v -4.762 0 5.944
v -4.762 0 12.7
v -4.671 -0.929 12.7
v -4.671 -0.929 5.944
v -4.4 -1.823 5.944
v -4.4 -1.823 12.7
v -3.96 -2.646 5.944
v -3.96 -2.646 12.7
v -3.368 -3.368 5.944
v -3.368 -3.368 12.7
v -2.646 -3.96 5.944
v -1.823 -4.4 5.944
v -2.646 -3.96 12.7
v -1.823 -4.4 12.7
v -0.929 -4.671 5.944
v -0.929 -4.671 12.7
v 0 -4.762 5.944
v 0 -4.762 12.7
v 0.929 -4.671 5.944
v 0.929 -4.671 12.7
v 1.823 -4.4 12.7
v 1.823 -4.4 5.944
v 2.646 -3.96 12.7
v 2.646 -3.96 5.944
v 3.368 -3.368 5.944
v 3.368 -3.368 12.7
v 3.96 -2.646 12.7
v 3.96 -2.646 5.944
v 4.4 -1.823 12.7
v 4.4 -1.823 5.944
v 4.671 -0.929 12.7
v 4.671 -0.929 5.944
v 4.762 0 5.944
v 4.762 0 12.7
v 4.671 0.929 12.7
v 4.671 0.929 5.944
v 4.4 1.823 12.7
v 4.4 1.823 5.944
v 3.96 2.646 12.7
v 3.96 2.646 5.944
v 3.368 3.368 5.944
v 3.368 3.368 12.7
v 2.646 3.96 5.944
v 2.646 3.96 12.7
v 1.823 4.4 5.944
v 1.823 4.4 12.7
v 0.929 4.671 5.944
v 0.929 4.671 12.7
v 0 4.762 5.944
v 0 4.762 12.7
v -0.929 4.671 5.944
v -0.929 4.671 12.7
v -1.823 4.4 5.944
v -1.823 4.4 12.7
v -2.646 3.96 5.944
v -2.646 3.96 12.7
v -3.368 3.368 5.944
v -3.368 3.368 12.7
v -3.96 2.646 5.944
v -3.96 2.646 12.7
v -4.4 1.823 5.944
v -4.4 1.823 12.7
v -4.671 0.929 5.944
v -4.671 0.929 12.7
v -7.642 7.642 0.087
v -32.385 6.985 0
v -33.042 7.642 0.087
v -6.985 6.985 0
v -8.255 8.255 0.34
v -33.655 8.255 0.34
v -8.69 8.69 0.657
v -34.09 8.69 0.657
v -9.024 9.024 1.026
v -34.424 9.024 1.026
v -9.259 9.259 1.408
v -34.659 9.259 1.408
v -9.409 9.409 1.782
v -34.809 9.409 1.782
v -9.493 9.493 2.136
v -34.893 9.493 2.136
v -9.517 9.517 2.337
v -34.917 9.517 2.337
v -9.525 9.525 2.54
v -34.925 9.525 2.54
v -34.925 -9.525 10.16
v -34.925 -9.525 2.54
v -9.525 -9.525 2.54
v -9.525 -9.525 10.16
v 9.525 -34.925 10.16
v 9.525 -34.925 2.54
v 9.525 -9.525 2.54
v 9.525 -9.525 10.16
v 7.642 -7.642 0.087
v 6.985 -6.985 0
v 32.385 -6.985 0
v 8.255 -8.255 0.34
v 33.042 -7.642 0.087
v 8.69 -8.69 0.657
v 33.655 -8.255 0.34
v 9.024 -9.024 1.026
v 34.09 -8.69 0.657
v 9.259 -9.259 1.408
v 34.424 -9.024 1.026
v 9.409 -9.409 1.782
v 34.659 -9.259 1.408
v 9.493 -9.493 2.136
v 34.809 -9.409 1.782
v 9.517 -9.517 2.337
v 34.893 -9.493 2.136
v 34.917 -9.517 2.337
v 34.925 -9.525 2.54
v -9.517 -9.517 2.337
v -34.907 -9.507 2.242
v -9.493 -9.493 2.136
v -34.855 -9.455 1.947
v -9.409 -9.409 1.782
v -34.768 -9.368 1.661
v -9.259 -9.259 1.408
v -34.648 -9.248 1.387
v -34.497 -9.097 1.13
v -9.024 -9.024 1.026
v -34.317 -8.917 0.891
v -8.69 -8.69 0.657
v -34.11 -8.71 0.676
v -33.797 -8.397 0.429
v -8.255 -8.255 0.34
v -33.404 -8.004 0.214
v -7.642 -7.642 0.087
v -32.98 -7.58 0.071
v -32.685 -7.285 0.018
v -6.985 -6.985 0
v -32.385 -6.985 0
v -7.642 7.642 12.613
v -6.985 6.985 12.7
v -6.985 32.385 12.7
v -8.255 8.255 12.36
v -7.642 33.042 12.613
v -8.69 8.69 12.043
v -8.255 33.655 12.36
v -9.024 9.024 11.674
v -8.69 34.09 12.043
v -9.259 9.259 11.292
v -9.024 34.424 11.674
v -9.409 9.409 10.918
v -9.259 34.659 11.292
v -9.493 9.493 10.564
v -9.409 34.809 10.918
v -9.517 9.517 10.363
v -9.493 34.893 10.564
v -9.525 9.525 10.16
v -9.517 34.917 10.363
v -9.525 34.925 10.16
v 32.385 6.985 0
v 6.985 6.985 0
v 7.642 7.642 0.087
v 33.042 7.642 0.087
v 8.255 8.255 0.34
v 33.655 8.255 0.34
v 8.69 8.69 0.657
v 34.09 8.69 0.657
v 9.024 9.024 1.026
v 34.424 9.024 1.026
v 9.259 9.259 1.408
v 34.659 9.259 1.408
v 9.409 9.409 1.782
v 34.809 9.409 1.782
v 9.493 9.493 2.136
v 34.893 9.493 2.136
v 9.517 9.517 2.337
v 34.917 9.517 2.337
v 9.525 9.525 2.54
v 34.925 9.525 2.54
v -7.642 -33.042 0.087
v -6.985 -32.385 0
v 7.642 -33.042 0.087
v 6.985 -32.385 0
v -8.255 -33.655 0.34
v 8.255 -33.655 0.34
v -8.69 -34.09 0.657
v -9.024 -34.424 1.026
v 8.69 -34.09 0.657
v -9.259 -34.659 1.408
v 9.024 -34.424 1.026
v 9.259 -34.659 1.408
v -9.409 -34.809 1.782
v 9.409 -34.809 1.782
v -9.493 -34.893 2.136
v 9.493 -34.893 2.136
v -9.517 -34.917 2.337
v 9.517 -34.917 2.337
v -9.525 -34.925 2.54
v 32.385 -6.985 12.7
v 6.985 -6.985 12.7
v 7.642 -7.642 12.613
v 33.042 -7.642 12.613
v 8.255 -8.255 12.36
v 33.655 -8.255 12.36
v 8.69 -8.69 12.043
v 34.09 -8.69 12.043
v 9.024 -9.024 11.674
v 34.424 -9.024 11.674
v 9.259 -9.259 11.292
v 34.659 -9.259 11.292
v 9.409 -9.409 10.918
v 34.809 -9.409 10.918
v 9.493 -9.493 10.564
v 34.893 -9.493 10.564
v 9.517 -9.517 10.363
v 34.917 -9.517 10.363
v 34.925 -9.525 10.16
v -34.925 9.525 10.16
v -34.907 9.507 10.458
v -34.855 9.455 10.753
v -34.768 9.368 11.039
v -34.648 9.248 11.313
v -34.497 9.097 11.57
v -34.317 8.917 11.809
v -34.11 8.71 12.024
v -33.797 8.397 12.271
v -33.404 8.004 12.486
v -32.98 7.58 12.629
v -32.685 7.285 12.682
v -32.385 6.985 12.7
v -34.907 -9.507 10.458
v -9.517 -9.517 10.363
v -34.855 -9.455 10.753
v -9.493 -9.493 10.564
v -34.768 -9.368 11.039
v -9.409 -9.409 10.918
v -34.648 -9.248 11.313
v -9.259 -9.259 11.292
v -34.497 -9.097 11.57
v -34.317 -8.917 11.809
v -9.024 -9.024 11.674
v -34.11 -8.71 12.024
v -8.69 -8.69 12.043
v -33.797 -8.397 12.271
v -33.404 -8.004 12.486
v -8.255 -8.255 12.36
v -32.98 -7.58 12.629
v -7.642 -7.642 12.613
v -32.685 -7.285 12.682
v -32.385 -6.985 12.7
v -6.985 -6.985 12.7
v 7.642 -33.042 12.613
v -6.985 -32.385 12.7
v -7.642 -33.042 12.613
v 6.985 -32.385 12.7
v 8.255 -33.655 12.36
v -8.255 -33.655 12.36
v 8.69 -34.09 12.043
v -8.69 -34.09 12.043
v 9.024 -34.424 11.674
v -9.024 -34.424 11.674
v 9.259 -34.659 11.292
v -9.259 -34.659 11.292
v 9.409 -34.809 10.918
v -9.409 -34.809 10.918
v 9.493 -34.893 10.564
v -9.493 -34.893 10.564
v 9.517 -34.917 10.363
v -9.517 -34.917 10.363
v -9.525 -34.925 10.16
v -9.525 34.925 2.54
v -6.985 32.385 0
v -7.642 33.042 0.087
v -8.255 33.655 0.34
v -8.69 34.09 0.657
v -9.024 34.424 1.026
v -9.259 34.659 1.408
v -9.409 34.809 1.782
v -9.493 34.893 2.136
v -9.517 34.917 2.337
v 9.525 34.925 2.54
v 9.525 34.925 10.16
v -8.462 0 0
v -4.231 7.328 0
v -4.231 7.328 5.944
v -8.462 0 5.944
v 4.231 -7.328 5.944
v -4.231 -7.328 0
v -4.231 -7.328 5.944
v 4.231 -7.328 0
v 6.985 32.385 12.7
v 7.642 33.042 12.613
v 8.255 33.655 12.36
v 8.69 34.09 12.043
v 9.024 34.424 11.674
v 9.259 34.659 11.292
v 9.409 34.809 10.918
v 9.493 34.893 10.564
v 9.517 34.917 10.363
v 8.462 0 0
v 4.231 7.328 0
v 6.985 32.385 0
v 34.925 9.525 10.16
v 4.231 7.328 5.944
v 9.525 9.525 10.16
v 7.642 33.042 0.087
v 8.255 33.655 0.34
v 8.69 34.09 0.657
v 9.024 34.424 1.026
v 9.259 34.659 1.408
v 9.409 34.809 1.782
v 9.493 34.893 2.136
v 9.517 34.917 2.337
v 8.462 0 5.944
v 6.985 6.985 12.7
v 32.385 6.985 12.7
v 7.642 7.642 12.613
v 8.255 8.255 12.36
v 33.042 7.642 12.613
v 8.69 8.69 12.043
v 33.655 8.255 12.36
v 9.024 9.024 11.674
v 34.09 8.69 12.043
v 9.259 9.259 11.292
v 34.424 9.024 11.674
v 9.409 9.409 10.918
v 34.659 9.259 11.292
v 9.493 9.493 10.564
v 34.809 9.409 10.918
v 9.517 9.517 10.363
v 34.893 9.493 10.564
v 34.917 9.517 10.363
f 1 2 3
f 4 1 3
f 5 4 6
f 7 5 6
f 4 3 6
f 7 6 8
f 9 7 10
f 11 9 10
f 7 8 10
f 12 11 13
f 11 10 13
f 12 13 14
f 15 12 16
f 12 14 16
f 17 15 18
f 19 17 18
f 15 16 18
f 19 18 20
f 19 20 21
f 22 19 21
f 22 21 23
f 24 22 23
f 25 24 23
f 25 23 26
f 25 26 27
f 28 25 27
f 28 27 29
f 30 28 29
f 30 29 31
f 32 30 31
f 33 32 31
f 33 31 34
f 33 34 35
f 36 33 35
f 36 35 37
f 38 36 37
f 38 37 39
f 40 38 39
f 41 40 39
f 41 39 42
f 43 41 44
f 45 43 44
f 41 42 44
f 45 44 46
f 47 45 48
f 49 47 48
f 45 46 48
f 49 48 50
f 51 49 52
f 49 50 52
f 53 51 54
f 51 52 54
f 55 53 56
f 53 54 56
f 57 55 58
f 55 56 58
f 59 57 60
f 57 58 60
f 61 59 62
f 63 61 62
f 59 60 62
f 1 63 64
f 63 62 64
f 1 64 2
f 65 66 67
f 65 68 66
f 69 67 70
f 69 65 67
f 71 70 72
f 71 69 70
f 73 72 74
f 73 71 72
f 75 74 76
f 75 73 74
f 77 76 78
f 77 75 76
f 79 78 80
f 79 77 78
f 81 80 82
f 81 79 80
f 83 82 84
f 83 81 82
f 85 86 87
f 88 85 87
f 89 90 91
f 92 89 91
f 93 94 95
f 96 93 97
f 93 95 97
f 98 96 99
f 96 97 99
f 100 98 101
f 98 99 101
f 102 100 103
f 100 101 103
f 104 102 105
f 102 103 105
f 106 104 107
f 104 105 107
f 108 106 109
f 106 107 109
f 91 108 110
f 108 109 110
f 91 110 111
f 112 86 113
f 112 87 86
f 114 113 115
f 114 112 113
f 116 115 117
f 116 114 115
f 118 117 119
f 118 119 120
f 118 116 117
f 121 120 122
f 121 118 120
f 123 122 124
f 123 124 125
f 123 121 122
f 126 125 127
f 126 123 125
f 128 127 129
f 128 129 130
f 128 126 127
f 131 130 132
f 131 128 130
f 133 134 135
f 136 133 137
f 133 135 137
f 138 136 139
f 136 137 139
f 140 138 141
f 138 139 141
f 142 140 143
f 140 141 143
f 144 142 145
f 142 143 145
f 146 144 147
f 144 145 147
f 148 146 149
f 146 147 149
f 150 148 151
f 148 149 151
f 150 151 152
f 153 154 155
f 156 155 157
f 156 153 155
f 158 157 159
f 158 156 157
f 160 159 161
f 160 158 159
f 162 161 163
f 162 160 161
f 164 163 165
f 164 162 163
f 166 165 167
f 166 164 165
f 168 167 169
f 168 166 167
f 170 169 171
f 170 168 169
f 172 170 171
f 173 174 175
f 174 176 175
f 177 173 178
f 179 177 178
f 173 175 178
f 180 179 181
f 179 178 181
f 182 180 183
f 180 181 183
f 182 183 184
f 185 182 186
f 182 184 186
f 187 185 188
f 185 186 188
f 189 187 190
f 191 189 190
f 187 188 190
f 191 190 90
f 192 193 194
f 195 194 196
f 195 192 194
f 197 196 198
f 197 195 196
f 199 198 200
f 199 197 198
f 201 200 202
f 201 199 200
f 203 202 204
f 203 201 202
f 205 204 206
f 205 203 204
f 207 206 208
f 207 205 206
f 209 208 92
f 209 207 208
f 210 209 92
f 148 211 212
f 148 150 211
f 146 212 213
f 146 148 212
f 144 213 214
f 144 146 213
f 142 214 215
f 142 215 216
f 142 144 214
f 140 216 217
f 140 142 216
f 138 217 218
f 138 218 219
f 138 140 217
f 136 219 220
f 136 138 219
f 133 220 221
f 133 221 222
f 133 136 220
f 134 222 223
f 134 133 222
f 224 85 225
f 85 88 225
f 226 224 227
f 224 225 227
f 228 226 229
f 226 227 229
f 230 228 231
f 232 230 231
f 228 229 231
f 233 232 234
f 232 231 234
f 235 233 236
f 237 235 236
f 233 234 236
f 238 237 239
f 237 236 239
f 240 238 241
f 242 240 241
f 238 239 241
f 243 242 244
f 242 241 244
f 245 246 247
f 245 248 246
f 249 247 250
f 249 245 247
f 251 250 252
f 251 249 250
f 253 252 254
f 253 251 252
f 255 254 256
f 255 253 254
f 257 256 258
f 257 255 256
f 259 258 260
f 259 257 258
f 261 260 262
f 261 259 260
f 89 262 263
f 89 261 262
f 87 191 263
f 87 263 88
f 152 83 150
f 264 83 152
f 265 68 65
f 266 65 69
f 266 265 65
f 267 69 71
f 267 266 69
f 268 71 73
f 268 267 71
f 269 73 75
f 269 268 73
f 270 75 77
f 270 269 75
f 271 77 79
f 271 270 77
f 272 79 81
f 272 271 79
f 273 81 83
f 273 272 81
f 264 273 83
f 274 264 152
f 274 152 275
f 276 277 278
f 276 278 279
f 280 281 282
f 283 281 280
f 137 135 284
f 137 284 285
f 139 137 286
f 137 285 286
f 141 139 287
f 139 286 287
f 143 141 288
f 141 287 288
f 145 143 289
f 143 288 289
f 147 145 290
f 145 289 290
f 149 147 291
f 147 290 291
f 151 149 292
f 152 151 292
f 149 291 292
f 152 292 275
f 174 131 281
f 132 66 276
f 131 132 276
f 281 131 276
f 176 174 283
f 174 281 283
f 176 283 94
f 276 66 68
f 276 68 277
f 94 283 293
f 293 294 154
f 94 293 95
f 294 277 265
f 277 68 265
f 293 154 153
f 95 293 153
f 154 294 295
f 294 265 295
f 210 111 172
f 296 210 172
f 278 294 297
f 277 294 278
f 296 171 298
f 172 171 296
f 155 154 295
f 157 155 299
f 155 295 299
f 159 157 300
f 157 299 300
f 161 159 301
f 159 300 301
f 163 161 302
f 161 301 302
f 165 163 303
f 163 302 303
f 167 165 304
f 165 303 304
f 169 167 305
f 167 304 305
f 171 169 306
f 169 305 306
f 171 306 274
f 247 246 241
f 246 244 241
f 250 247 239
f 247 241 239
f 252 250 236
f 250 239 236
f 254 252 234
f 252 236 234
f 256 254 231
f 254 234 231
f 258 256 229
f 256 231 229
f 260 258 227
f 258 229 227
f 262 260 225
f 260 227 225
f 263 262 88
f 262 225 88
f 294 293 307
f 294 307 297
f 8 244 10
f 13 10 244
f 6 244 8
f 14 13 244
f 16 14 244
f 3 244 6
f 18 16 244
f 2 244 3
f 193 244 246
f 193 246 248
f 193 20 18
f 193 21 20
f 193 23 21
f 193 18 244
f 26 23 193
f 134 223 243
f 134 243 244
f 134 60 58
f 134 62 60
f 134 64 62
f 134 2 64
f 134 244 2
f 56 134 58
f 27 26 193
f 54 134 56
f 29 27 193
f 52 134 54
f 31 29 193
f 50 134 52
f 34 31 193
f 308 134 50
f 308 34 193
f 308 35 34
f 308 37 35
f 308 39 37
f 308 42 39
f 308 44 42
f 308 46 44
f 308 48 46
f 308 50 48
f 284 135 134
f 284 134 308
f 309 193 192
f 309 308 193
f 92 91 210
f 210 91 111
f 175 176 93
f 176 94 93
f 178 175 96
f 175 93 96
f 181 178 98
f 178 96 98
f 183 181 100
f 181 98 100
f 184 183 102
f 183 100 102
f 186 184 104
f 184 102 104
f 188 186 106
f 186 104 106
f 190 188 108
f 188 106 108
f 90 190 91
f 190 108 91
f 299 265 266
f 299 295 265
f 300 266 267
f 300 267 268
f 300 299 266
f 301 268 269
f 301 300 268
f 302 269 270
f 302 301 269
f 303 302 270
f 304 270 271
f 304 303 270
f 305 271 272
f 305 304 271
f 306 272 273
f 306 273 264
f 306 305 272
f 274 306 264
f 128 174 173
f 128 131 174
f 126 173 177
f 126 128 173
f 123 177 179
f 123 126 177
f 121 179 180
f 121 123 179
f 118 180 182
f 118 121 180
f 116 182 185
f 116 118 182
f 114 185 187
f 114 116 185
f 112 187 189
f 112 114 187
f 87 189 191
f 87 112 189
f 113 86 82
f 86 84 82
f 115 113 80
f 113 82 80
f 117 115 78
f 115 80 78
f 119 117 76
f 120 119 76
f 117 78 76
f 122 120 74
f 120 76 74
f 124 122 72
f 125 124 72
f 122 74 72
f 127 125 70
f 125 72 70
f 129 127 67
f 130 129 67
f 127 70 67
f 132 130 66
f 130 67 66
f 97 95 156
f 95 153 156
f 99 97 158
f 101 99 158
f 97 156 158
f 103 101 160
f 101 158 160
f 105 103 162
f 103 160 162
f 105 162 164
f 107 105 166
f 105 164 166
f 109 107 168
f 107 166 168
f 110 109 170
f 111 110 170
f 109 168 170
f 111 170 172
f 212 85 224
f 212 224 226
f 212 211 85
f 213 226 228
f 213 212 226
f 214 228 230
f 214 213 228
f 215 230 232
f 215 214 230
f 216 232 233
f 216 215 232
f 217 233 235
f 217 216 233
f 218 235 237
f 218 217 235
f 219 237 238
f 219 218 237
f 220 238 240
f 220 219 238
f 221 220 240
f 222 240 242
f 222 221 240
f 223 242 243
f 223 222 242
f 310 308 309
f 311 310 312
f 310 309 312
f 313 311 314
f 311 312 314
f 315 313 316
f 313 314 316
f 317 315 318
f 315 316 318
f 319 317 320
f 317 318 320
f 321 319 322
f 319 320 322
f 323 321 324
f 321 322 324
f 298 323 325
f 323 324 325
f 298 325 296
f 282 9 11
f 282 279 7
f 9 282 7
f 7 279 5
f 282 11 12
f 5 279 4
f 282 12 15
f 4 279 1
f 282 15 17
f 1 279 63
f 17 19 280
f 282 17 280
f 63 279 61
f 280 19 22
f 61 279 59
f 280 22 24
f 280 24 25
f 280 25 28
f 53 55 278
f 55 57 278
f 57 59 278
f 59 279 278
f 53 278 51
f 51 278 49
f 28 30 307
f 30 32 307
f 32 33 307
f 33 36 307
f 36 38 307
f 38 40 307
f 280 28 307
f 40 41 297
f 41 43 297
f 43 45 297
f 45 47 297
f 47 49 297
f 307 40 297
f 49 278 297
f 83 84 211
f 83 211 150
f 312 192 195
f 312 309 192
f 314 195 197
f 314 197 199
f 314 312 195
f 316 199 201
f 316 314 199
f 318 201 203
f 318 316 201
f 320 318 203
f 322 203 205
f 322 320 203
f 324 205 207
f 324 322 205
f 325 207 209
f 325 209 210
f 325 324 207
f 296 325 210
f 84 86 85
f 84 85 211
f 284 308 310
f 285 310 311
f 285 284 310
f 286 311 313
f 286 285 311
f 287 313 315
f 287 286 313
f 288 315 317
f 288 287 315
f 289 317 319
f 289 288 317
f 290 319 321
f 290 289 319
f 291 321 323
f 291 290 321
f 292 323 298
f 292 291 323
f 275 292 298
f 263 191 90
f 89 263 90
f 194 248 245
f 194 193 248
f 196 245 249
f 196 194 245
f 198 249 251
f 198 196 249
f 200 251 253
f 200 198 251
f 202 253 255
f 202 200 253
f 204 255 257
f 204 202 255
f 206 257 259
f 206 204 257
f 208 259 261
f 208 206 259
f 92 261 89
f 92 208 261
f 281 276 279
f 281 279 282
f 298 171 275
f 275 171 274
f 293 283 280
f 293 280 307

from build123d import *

# Parameters (mm, degrees)
F0_W     = 19.05
F0_H     = 69.85
F1_DEPTH = 12.7
F2_W     = 69.85
F2_H     = 19.05
F3_DEPTH = 12.7
F4_R     = 2.54
F5_R     = 2.54
F7_DEPTH = 5.9436
F9_D     = 9.525


with BuildPart() as f1:
    # F0 (on Top) → F1 (new body)
    with BuildSketch(Plane.XY):
        Rectangle(F0_W, F0_H)
    extrude(amount=F1_DEPTH)

    # F2 (on Top) → F3 (join)
    with BuildSketch(Plane.XY):
        Rectangle(F2_W, F2_H)
    extrude(amount=F3_DEPTH)

    # F4
    f4_edges = [f1.edges().sort_by_distance(p)[0] for p in [
        (0, 34.925, 12.7),
        (-9.525, 22.225, 12.7),
        (-9.525, -22.225, 12.7),
        (9.525, 22.225, 12.7),
        (9.525, -22.225, 12.7),
        (-22.225, 9.525, 12.7),
        (-34.925, 0, 12.7),
        (-22.225, -9.525, 12.7),
        (0, -34.925, 12.7),
        (22.225, -9.525, 12.7),
        (34.925, 0, 12.7),
        (22.225, 9.525, 12.7),
    ]]
    fillet(f4_edges, radius=F4_R)

    # F5
    f5_edges = [f1.edges().sort_by_distance(p)[0] for p in [
        (-9.525, 22.225, 0),
        (-9.525, -22.225, 0),
        (0, -34.925, 0),
        (9.525, 22.225, 0),
        (9.525, -22.225, 0),
        (0, 34.925, 0),
        (-22.225, 9.525, 0),
        (-34.925, 0, 0),
        (-22.225, -9.525, 0),
        (22.225, -9.525, 0),
        (34.925, 0, 0),
        (22.225, 9.525, 0),
    ]]
    fillet(f5_edges, radius=F5_R)

    # F6 (on Top) → F7 (cut)
    with BuildSketch(Plane.XY):
        Polygon((-4.230765, 7.3279), (-8.46153, 0), (-4.230765, -7.3279), (4.230765, -7.3279), (8.46153, 0), (4.230765, 7.3279), align=None)
    extrude(amount=F7_DEPTH, mode=Mode.SUBTRACT)

    # F9 (through all)
    with Locations(Plane(origin=(0, 0, 0), x_dir=(1, 0, 0), z_dir=(0, 0, -1))):
        with Locations((0, 0)):
            Hole(F9_D / 2)


solid = f1.part
